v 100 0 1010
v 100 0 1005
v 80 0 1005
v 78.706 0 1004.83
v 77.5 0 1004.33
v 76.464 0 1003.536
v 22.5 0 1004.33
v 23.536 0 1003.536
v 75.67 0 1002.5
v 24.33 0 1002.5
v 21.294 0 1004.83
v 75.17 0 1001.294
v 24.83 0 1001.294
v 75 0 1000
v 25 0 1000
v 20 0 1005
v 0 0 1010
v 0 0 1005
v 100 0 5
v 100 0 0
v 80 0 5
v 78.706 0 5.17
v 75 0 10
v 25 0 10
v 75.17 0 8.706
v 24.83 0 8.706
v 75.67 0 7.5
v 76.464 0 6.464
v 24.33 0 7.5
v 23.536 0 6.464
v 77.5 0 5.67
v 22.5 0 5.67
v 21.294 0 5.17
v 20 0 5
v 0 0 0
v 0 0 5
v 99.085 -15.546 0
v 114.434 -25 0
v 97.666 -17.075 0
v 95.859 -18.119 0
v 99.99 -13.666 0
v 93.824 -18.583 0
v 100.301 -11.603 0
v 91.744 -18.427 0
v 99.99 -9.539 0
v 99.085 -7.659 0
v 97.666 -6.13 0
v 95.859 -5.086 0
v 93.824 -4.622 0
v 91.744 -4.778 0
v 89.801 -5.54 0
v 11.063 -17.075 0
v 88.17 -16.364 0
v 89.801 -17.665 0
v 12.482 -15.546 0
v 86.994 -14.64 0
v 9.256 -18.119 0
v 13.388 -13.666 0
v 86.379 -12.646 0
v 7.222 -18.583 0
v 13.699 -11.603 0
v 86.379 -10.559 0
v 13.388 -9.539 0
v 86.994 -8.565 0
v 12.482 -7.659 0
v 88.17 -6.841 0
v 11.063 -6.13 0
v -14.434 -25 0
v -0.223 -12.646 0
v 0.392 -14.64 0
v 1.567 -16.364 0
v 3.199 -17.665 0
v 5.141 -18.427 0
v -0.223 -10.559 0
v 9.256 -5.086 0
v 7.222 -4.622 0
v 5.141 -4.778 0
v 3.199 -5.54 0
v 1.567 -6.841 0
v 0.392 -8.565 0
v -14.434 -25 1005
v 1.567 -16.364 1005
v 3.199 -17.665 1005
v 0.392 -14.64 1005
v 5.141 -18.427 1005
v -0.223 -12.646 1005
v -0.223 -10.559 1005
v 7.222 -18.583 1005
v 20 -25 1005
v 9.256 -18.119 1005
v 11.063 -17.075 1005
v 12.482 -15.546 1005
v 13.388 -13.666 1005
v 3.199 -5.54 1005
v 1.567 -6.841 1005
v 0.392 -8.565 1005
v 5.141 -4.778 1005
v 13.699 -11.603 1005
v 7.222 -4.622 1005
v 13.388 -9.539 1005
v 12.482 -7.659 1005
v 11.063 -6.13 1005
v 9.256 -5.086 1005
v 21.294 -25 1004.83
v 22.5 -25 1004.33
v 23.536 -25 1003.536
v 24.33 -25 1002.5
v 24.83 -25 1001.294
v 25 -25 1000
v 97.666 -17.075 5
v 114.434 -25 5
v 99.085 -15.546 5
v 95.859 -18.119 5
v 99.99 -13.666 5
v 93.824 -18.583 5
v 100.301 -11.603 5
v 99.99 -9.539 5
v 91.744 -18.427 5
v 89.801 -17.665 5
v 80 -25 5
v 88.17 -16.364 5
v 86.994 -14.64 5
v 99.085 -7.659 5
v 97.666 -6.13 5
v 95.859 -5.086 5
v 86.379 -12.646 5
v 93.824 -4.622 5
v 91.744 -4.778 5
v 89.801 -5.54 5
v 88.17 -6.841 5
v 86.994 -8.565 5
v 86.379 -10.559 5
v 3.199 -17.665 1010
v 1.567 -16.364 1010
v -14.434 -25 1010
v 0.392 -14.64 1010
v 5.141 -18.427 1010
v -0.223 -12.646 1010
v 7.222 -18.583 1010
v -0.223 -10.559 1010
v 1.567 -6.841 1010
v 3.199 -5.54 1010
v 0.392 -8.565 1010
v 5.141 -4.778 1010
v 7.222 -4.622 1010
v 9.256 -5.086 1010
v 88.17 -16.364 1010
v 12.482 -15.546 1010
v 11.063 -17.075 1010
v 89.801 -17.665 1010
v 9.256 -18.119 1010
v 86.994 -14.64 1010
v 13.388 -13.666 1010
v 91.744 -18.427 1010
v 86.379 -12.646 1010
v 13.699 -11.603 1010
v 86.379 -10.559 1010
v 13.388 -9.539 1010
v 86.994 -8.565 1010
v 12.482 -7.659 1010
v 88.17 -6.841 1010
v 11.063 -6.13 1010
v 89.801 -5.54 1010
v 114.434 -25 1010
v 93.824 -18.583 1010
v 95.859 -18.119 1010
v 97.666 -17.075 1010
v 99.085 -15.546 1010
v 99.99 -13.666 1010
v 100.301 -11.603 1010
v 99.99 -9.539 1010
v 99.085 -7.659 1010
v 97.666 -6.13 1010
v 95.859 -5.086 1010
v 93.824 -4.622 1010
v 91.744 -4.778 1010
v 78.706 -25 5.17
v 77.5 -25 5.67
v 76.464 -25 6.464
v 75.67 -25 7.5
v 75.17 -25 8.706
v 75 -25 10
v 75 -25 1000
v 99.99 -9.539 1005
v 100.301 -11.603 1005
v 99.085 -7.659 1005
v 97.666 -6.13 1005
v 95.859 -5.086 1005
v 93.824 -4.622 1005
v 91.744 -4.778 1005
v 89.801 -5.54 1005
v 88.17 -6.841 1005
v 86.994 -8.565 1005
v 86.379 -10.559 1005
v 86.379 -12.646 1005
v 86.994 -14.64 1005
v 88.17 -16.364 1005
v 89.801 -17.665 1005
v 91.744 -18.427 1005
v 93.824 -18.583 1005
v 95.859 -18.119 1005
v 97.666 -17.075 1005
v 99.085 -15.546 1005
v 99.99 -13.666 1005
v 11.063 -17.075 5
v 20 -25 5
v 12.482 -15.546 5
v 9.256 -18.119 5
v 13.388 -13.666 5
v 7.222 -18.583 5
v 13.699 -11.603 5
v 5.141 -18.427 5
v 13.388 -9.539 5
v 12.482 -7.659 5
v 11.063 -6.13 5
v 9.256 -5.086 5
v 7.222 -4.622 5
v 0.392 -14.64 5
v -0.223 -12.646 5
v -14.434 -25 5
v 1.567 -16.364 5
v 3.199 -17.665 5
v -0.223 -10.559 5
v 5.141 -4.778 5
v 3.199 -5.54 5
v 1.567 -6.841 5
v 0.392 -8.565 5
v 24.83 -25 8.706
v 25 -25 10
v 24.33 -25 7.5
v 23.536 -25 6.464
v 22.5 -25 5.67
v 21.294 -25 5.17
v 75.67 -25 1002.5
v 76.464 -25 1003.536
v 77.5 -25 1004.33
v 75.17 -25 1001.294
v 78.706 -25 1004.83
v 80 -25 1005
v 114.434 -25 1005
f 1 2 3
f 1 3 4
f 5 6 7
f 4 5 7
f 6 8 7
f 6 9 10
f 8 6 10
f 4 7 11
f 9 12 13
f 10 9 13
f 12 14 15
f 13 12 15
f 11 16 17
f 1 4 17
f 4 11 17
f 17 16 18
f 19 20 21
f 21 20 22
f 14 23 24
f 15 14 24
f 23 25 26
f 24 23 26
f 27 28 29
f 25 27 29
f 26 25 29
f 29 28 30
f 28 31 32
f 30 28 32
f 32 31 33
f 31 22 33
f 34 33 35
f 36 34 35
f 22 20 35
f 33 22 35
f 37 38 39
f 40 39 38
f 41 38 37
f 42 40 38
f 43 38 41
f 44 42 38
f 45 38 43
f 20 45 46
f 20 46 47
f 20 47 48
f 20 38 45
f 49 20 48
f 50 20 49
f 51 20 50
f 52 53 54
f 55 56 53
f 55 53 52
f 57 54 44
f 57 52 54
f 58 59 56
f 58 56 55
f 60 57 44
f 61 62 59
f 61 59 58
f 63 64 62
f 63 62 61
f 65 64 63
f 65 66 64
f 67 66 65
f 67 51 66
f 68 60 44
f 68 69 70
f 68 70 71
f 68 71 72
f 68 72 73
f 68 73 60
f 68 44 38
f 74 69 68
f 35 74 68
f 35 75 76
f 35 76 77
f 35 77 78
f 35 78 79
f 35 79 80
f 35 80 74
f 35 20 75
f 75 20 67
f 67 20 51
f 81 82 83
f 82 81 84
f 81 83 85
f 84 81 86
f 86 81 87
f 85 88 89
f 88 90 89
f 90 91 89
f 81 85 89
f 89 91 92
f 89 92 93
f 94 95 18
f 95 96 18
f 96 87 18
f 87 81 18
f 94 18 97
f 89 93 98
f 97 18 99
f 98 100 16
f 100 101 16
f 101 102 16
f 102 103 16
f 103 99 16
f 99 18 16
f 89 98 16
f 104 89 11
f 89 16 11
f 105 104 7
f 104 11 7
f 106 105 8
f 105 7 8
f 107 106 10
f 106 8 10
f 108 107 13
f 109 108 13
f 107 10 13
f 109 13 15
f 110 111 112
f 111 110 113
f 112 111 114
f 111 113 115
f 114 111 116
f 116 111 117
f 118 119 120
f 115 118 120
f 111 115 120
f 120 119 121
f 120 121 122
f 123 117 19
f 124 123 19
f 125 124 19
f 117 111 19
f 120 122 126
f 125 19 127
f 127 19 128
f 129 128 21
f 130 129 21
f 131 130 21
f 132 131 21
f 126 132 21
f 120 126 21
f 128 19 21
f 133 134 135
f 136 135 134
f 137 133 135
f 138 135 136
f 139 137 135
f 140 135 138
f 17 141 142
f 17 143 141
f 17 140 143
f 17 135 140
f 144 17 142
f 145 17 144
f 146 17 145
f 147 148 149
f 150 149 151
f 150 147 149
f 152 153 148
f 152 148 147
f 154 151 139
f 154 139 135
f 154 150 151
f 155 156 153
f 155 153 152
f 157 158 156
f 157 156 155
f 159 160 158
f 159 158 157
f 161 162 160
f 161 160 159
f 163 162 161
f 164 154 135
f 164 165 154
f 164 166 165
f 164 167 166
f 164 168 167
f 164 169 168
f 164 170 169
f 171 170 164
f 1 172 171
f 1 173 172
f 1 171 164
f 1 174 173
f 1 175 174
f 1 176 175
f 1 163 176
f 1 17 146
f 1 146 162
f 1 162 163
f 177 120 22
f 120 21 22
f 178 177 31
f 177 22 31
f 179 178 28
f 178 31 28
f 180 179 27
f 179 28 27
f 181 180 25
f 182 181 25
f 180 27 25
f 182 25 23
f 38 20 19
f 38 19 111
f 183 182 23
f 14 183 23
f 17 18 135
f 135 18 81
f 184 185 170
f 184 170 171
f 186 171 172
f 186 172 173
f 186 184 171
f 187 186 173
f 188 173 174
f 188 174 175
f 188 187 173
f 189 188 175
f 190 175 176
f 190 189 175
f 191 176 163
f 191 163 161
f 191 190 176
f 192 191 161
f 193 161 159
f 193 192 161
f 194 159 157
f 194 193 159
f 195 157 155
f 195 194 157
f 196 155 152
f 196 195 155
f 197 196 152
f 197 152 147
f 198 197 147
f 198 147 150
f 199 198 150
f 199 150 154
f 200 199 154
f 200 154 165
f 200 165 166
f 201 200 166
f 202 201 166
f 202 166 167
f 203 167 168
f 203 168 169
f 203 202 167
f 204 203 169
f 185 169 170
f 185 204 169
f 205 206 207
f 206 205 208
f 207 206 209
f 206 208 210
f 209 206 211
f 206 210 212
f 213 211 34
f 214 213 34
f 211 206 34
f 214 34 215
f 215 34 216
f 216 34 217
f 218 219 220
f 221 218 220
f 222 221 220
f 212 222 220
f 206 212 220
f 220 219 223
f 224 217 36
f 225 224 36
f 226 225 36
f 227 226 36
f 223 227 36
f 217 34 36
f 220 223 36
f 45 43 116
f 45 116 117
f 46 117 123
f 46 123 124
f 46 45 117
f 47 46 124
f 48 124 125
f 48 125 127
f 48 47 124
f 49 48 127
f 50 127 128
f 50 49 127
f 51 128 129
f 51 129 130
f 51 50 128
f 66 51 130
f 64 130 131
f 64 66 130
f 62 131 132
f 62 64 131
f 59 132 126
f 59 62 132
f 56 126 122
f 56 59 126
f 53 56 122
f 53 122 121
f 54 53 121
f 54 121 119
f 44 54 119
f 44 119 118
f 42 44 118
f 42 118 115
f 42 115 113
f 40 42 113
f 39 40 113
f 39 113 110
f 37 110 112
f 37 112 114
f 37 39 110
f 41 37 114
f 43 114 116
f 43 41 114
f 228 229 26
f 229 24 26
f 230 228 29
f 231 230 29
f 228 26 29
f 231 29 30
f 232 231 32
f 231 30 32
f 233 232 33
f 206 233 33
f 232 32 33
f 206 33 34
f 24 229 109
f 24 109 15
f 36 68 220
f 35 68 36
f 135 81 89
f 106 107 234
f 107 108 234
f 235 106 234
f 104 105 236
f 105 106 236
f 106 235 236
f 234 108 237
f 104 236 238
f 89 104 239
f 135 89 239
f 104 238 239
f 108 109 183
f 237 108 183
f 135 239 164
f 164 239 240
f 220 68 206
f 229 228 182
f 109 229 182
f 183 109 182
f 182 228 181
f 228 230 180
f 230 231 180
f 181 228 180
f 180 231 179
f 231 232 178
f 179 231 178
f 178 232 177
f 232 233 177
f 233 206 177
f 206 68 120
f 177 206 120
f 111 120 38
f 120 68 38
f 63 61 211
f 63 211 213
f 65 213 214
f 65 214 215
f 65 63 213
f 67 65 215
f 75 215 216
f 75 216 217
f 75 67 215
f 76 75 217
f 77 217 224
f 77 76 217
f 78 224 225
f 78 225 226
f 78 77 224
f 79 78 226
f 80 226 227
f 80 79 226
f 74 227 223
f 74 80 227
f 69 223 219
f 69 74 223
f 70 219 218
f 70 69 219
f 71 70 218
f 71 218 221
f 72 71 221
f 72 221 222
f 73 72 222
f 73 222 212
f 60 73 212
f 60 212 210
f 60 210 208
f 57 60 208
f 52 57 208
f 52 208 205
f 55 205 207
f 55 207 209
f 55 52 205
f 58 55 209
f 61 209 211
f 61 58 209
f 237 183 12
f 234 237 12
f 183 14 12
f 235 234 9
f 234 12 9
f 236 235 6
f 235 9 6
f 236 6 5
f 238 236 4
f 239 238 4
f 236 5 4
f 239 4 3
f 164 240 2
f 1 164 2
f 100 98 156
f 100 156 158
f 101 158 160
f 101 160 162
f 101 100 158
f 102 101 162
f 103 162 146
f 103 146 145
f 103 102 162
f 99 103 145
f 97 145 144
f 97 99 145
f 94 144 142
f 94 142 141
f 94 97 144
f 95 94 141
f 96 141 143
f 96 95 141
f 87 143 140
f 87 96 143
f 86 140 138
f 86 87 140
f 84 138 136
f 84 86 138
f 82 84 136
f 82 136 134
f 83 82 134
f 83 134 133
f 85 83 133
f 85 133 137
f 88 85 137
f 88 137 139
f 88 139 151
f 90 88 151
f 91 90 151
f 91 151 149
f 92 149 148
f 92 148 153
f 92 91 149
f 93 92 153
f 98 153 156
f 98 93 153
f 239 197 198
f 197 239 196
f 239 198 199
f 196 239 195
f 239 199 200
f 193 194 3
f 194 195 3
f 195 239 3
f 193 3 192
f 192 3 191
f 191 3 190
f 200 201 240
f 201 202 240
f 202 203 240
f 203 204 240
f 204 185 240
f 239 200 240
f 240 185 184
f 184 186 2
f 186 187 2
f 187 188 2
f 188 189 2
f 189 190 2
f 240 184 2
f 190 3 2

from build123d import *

# Parameters (mm, degrees)
SZKIC1_R                    = 7
DODANIE_WYCI_GNI_CIE1_DEPTH = 5
SZKIC2_W                    = 50
SZKIC2_H                    = 25
DODANIE_WYCI_GNI_CIE2_DEPTH = 1000
SZKIC3_R                    = 7
DODANIE_WYCI_GNI_CIE3_DEPTH = 5
ZAOKR_GLENIE1_R             = 5
ZAOKR_GLENIE2_R             = 5
ZAOKR_GLENIE3_R             = 5
ZAOKR_GLENIE4_R             = 5


with BuildPart() as part:
    # Szkic1 → Dodanie-wyciągnięcie1 (new body)
    with BuildSketch(Plane.XY):
        Polygon((0, 0), (100, 0), (114.43375673, -25), (-14.43375673, -25), align=None)
        with Locations((93.301270189, -11.602540378)):
            Circle(SZKIC1_R, mode=Mode.SUBTRACT)
        with Locations((6.698729811, -11.602540378)):
            Circle(SZKIC1_R, mode=Mode.SUBTRACT)
    extrude(amount=DODANIE_WYCI_GNI_CIE1_DEPTH)

    # Szkic2 → Dodanie-wyciągnięcie2 (add)
    with BuildSketch(Plane.XY.offset(5)):
        with Locations((50, -12.5)):
            Rectangle(SZKIC2_W, SZKIC2_H)
    extrude(amount=DODANIE_WYCI_GNI_CIE2_DEPTH)

    # Szkic3 → Dodanie-wyciągnięcie3 (add)
    with BuildSketch(Plane.XY.offset(1005)):
        Polygon((-14.43375673, -25), (25, -25), (75, -25), (114.43375673, -25), (100, 0), (75, 0), (25, 0), (0, 0), align=None)
        with Locations((93.301270189, -11.602540378)):
            Circle(SZKIC3_R, mode=Mode.SUBTRACT)
        with Locations((6.698729811, -11.602540378)):
            Circle(SZKIC3_R, mode=Mode.SUBTRACT)
    extrude(amount=DODANIE_WYCI_GNI_CIE3_DEPTH)

    # Zaokrąglenie1
    zaokr_glenie1_edges = [part.edges().sort_by_distance(p)[0] for p in [
        (25, -12.5, 5),
    ]]
    fillet(zaokr_glenie1_edges, radius=ZAOKR_GLENIE1_R)

    # Zaokrąglenie2
    zaokr_glenie2_edges = [part.edges().sort_by_distance(p)[0] for p in [
        (75, -12.5, 5),
    ]]
    fillet(zaokr_glenie2_edges, radius=ZAOKR_GLENIE2_R)

    # Zaokrąglenie3
    zaokr_glenie3_edges = [part.edges().sort_by_distance(p)[0] for p in [
        (75, -12.5, 1005),
    ]]
    fillet(zaokr_glenie3_edges, radius=ZAOKR_GLENIE3_R)

    # Zaokrąglenie4
    zaokr_glenie4_edges = [part.edges().sort_by_distance(p)[0] for p in [
        (25, -12.5, 1005),
    ]]
    fillet(zaokr_glenie4_edges, radius=ZAOKR_GLENIE4_R)


solid = part.part
